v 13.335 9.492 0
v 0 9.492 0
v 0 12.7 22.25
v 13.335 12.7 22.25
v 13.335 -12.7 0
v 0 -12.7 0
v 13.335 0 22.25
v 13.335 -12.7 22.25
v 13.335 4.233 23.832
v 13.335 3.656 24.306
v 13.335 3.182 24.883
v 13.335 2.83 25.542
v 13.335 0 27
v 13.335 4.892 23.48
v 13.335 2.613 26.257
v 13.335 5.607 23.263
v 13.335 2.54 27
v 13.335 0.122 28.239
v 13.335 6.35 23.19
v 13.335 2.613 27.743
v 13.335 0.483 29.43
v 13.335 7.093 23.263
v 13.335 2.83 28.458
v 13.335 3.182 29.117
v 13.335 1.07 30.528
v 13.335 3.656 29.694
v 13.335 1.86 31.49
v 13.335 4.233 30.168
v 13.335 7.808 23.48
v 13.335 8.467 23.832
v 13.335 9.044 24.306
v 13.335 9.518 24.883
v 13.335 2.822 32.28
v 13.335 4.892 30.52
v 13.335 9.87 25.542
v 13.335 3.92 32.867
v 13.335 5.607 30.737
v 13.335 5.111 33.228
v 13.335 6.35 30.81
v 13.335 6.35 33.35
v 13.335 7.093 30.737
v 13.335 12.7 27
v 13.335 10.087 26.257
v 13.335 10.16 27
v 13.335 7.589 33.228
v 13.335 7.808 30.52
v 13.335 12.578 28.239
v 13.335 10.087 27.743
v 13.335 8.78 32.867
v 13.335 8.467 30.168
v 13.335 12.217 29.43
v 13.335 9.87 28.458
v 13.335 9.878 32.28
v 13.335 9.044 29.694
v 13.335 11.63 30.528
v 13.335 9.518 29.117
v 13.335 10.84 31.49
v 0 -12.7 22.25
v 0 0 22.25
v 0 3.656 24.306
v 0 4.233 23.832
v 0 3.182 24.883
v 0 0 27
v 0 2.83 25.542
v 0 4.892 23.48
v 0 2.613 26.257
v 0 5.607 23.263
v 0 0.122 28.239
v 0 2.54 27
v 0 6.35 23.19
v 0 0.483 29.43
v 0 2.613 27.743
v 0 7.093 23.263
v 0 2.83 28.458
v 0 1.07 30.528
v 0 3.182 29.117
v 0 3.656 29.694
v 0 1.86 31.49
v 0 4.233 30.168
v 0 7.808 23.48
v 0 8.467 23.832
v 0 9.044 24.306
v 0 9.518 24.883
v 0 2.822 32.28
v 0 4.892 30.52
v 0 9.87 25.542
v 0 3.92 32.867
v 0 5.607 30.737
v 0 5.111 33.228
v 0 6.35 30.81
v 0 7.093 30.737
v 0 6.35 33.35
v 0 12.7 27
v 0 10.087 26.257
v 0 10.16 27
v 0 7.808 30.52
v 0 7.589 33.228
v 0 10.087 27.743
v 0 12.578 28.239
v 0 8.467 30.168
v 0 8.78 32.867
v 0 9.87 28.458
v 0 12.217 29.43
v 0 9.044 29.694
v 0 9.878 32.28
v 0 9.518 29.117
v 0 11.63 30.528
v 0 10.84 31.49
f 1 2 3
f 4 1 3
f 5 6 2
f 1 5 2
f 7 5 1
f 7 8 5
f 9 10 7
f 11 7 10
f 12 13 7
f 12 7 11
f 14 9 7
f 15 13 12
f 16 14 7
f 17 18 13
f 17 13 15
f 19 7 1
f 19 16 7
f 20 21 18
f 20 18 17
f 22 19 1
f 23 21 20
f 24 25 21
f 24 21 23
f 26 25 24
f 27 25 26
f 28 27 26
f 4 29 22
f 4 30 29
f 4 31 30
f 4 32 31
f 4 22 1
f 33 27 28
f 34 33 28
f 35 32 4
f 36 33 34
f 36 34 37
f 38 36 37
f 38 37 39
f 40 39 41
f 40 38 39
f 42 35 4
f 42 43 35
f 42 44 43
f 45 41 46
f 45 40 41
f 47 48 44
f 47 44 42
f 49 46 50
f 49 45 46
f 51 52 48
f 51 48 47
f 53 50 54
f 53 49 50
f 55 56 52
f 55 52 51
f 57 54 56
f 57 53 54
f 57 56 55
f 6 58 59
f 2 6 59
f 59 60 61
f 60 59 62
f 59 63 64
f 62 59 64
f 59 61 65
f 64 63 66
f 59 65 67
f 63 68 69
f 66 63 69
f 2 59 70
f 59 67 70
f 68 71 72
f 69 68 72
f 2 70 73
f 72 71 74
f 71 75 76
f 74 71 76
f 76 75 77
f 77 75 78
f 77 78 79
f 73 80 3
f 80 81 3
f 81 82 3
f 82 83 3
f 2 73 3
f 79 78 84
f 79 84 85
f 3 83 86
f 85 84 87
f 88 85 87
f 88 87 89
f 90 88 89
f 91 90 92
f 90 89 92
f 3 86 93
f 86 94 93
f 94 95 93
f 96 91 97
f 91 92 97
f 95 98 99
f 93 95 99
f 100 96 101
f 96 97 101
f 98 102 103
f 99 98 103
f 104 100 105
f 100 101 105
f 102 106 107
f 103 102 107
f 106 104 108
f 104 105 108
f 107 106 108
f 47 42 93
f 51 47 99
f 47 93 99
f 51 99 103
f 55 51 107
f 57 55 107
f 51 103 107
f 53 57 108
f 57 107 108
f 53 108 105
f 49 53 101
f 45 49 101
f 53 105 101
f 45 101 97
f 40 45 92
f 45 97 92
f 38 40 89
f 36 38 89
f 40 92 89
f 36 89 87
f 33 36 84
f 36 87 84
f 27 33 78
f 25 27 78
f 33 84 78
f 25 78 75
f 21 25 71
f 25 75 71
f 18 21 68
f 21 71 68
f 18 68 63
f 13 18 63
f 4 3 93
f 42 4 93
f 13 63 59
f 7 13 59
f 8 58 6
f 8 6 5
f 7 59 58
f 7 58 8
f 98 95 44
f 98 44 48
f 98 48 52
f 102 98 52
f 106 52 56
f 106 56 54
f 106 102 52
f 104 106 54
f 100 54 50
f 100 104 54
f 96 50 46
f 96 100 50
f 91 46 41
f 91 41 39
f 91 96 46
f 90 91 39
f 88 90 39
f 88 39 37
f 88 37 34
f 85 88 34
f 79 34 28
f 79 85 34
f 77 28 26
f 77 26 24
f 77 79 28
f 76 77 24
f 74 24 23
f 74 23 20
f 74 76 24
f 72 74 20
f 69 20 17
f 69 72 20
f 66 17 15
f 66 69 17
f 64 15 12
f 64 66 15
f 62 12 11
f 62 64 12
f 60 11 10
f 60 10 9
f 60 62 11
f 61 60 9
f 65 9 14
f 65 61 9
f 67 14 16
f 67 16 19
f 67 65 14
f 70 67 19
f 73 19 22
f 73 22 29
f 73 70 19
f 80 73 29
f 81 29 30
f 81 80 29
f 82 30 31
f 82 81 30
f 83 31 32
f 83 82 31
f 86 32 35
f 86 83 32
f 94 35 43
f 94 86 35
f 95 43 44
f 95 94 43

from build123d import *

# Parameters (mm, degrees)
F0_W     = 13.335
F0_H     = 22.2504
F1_DEPTH = 12.7
F2_R     = 3.81
F3_DEPTH = 13.335


with BuildPart() as f1:
    # F0 (on Front) → F1 (new body)
    with BuildSketch(Plane.XZ):
        with Locations((6.6675, 11.1252)):
            Rectangle(F0_W, F0_H)
    extrude(amount=F1_DEPTH)

    # F2 (on Right) → F3 (join)
    with BuildSketch(Plane.YZ):
        Polygon((0, 22.2504), (0, 0), (9.491803, 0), (12.700001, 22.2504), align=None)
        with BuildLine():
            Line((0, 27.0002), (0, 22.2504))
            Line((0, 22.2504), (12.700001, 22.2504))
            Line((12.700001, 22.2504), (12.700001, 27.0002))
            ThreePointArc((12.700001, 27.0002), (6.35, 33.3502), (0, 27.0002))
        make_face()
        with Locations((6.35, 27.0002)):
            Circle(F2_R, mode=Mode.SUBTRACT)
    extrude(amount=F3_DEPTH)


solid = f1.part
